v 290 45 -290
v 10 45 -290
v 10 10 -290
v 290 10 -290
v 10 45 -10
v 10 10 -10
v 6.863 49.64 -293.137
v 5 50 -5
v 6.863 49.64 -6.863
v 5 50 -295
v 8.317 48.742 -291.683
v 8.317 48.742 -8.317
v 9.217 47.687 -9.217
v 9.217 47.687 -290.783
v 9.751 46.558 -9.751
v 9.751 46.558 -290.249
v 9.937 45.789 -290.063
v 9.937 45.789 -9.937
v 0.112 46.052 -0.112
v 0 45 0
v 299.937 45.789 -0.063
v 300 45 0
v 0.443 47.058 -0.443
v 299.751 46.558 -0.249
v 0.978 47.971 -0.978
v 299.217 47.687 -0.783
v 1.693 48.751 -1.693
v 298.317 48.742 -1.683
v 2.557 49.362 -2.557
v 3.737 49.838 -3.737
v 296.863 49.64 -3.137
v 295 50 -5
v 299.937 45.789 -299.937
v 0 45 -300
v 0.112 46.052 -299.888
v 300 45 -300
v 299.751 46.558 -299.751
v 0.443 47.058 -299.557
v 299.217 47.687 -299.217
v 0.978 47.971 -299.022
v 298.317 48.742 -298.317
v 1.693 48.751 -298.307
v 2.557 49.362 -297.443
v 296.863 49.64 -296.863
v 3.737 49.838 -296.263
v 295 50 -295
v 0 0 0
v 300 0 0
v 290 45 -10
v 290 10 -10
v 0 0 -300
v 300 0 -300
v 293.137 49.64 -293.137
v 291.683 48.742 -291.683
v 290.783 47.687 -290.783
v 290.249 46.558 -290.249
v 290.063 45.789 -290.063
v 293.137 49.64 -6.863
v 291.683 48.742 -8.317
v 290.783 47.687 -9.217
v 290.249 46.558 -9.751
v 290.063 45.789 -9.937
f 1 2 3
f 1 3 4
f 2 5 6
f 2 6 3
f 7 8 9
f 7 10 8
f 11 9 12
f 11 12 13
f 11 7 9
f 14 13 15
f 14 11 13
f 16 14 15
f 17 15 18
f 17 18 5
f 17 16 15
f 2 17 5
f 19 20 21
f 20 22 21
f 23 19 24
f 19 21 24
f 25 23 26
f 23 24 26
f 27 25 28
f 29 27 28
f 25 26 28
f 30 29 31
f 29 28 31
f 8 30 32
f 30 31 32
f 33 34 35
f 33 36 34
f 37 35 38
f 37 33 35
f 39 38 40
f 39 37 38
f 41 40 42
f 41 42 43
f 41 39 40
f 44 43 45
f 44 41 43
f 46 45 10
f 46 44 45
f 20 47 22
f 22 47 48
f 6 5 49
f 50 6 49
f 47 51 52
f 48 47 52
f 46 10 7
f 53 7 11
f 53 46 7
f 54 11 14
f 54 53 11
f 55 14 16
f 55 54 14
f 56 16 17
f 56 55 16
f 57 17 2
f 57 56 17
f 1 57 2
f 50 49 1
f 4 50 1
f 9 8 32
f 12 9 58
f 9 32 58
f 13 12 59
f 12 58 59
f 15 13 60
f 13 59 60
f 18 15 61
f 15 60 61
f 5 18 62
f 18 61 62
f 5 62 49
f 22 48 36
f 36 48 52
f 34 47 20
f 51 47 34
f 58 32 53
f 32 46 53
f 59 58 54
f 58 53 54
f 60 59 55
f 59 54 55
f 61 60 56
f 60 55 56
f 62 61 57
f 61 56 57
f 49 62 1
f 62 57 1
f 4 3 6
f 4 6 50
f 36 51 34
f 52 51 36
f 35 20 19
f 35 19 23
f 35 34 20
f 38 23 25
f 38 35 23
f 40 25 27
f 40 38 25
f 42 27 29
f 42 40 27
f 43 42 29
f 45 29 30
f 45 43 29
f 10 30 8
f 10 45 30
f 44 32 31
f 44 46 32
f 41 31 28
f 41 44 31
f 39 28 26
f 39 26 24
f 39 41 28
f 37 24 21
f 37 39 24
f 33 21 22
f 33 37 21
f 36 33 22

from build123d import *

# Parameters (mm, degrees)
SKETCH1_W           = 300
SKETCH1_H           = 300
BOSS_EXTRUDE1_DEPTH = 50
SKETCH2_W           = 280
SKETCH2_H           = 280
CUT_EXTRUDE1_DEPTH  = 40
FILLET1_R           = 5


with BuildPart() as part:
    # Sketch1 → Boss-Extrude1 (new body)
    with BuildSketch(Plane(origin=(0, 0, 0), x_dir=(1, 0, 0), z_dir=(0, 1, 0))):
        with Locations((150, 150)):
            Rectangle(SKETCH1_W, SKETCH1_H)
    extrude(amount=BOSS_EXTRUDE1_DEPTH)

    # Sketch2 → Cut-Extrude1 (cut)
    with BuildSketch(Plane(origin=(0, 50, 0), x_dir=(1, 0, 0), z_dir=(0, 1, 0))):
        with Locations((150, 150)):
            Rectangle(SKETCH2_W, SKETCH2_H)
    extrude(amount=-CUT_EXTRUDE1_DEPTH, mode=Mode.SUBTRACT)

    # Fillet1
    fillet1_edges = [part.edges().sort_by_distance(p)[0] for p in [
        (300, 50, -150),
        (150, 50, 0),
        (290, 50, -150),
        (150, 50, -290),
        (10, 50, -150),
        (150, 50, -10),
        (0, 50, -150),
        (150, 50, -300),
    ]]
    fillet(fillet1_edges, radius=FILLET1_R - 0.0001)  # a hair under: the kernel refuses the full size


solid = part.part
